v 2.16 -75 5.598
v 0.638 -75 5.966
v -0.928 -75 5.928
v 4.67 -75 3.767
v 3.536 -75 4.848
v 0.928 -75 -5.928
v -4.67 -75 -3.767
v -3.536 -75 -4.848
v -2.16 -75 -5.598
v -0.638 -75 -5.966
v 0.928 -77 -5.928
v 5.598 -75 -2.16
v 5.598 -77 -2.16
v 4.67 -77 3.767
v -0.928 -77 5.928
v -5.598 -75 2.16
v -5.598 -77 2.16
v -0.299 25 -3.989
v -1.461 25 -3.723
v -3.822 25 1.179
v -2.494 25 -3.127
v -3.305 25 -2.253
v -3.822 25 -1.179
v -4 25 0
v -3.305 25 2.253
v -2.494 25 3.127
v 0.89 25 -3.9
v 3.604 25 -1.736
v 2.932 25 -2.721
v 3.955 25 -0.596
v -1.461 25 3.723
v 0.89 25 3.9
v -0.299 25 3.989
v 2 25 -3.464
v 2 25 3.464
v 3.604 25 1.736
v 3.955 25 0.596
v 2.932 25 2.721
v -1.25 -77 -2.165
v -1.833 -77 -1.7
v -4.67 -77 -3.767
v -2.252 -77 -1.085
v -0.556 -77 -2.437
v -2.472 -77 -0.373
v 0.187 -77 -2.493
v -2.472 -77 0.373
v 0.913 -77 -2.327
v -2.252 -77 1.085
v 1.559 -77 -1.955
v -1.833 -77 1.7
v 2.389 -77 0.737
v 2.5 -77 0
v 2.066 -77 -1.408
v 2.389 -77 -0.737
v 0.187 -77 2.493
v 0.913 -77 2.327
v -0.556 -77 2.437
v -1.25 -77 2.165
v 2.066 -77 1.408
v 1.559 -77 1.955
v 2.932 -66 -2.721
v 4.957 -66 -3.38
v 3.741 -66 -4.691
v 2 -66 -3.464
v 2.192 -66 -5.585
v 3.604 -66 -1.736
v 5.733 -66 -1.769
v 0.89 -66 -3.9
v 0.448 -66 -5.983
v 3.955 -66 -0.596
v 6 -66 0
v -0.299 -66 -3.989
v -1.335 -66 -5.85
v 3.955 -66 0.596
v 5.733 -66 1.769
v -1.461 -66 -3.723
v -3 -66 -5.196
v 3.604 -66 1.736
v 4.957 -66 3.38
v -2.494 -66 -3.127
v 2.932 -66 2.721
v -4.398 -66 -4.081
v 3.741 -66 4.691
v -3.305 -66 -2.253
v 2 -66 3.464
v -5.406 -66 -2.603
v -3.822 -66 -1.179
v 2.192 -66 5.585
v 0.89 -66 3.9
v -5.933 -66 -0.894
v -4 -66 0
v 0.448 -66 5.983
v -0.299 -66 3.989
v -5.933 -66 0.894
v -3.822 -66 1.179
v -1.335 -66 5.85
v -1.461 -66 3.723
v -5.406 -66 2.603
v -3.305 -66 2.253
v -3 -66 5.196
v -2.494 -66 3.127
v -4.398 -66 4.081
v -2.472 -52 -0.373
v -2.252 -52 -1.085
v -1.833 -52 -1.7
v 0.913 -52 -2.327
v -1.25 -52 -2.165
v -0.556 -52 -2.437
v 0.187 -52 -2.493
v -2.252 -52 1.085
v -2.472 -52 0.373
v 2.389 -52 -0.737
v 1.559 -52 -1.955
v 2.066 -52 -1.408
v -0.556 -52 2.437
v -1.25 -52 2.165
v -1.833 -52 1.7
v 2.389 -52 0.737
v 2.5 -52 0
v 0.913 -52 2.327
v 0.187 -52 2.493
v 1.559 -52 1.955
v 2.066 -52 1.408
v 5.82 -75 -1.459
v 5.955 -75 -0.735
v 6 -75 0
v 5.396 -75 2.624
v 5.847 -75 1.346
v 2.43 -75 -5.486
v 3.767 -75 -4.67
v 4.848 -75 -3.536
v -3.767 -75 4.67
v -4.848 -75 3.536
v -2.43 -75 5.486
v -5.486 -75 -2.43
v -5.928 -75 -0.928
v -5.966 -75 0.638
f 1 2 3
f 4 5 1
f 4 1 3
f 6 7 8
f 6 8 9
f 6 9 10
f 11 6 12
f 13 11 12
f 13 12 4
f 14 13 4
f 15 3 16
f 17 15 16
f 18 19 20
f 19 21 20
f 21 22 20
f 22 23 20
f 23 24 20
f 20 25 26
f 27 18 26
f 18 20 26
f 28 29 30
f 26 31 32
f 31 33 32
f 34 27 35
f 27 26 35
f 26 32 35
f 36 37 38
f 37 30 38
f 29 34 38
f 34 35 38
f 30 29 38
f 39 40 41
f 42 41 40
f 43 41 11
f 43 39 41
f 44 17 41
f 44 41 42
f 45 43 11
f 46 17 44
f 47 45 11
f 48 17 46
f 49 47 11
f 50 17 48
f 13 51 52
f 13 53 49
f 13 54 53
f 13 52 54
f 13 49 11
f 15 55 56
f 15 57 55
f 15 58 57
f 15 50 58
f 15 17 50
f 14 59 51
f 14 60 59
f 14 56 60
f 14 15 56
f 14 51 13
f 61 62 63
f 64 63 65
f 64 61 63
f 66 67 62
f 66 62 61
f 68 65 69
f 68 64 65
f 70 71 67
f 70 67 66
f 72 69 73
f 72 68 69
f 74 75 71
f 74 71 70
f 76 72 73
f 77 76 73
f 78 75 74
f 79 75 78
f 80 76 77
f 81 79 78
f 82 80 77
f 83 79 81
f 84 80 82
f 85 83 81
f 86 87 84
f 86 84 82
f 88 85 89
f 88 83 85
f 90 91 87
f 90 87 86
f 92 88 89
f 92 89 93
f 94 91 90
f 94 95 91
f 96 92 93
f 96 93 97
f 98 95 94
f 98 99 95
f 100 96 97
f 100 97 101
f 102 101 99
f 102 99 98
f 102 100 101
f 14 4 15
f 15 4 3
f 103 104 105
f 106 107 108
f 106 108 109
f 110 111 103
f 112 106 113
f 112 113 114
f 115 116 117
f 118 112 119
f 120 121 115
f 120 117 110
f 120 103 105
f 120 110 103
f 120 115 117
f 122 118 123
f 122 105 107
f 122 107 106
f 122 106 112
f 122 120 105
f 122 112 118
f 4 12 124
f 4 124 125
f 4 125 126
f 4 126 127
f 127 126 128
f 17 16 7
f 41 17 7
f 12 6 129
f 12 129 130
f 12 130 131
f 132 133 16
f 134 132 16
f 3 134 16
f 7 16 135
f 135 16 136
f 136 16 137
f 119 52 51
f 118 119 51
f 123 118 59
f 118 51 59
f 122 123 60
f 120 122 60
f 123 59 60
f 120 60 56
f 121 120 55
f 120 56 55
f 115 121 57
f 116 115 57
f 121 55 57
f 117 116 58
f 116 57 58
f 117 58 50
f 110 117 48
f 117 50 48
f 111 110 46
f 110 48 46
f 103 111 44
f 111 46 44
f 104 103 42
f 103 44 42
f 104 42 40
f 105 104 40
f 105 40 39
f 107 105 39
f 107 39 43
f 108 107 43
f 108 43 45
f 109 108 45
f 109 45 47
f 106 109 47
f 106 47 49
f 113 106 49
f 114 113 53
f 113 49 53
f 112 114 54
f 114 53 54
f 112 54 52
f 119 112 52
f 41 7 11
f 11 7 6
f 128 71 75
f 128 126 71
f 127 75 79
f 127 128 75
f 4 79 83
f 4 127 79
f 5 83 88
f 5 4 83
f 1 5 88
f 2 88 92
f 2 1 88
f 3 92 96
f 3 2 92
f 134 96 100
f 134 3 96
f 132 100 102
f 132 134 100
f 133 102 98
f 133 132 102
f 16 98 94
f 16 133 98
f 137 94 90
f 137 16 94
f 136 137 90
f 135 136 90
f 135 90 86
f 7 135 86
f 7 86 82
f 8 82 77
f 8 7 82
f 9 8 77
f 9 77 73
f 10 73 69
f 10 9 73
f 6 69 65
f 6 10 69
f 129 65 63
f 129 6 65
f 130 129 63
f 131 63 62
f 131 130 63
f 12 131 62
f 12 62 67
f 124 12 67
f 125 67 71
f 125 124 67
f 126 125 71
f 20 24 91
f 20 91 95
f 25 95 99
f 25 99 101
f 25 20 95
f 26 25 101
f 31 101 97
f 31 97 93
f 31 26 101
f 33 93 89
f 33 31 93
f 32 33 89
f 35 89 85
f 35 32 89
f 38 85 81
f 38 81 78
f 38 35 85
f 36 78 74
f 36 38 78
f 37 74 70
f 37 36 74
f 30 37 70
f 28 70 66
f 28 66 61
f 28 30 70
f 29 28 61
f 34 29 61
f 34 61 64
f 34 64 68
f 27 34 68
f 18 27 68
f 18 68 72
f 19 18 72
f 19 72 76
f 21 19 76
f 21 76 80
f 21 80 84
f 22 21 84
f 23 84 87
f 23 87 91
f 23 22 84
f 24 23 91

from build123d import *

# Parameters (mm, degrees)
F0_R          = 6
F1_DEPTH      = 75
F1_DEPTH_BACK = 25
F3_DEPTH      = 2
F4_R          = 2.5
F5_DEPTH      = 25
F6_R          = 6
F6_R_2        = 4
F7_DEPTH      = 91


with BuildPart() as f1:
    # F0 (on Front) → F1 (new body, two sides)
    with BuildSketch(Plane.XZ) as f1_sk:
        Circle(F0_R)
    extrude(amount=F1_DEPTH)
    extrude(f1_sk.sketch, amount=-F1_DEPTH_BACK)

    # F2 (on face) → F3 (join)
    with BuildSketch(Plane.XZ.offset(75)):
        Polygon((5.597545, -2.160437), (4.669766, 3.767398), (-0.927779, 5.927835), (-5.597545, 2.160437), (-4.669766, -3.767398), (0.927779, -5.927835), align=None)
    extrude(amount=F3_DEPTH)

    # F4 (on face) → F5 (cut)
    with BuildSketch(Plane.XZ.offset(77)):
        Circle(F4_R)
    extrude(amount=-F5_DEPTH, mode=Mode.SUBTRACT)

    # F6 (on face) → F7 (cut)
    with BuildSketch(Plane(origin=(0, 25, 0), x_dir=(-1, 0, 0), z_dir=(0, 1, 0))):
        Circle(F6_R)
        Circle(F6_R_2, mode=Mode.SUBTRACT)
    extrude(amount=-F7_DEPTH, mode=Mode.SUBTRACT)


solid = f1.part
